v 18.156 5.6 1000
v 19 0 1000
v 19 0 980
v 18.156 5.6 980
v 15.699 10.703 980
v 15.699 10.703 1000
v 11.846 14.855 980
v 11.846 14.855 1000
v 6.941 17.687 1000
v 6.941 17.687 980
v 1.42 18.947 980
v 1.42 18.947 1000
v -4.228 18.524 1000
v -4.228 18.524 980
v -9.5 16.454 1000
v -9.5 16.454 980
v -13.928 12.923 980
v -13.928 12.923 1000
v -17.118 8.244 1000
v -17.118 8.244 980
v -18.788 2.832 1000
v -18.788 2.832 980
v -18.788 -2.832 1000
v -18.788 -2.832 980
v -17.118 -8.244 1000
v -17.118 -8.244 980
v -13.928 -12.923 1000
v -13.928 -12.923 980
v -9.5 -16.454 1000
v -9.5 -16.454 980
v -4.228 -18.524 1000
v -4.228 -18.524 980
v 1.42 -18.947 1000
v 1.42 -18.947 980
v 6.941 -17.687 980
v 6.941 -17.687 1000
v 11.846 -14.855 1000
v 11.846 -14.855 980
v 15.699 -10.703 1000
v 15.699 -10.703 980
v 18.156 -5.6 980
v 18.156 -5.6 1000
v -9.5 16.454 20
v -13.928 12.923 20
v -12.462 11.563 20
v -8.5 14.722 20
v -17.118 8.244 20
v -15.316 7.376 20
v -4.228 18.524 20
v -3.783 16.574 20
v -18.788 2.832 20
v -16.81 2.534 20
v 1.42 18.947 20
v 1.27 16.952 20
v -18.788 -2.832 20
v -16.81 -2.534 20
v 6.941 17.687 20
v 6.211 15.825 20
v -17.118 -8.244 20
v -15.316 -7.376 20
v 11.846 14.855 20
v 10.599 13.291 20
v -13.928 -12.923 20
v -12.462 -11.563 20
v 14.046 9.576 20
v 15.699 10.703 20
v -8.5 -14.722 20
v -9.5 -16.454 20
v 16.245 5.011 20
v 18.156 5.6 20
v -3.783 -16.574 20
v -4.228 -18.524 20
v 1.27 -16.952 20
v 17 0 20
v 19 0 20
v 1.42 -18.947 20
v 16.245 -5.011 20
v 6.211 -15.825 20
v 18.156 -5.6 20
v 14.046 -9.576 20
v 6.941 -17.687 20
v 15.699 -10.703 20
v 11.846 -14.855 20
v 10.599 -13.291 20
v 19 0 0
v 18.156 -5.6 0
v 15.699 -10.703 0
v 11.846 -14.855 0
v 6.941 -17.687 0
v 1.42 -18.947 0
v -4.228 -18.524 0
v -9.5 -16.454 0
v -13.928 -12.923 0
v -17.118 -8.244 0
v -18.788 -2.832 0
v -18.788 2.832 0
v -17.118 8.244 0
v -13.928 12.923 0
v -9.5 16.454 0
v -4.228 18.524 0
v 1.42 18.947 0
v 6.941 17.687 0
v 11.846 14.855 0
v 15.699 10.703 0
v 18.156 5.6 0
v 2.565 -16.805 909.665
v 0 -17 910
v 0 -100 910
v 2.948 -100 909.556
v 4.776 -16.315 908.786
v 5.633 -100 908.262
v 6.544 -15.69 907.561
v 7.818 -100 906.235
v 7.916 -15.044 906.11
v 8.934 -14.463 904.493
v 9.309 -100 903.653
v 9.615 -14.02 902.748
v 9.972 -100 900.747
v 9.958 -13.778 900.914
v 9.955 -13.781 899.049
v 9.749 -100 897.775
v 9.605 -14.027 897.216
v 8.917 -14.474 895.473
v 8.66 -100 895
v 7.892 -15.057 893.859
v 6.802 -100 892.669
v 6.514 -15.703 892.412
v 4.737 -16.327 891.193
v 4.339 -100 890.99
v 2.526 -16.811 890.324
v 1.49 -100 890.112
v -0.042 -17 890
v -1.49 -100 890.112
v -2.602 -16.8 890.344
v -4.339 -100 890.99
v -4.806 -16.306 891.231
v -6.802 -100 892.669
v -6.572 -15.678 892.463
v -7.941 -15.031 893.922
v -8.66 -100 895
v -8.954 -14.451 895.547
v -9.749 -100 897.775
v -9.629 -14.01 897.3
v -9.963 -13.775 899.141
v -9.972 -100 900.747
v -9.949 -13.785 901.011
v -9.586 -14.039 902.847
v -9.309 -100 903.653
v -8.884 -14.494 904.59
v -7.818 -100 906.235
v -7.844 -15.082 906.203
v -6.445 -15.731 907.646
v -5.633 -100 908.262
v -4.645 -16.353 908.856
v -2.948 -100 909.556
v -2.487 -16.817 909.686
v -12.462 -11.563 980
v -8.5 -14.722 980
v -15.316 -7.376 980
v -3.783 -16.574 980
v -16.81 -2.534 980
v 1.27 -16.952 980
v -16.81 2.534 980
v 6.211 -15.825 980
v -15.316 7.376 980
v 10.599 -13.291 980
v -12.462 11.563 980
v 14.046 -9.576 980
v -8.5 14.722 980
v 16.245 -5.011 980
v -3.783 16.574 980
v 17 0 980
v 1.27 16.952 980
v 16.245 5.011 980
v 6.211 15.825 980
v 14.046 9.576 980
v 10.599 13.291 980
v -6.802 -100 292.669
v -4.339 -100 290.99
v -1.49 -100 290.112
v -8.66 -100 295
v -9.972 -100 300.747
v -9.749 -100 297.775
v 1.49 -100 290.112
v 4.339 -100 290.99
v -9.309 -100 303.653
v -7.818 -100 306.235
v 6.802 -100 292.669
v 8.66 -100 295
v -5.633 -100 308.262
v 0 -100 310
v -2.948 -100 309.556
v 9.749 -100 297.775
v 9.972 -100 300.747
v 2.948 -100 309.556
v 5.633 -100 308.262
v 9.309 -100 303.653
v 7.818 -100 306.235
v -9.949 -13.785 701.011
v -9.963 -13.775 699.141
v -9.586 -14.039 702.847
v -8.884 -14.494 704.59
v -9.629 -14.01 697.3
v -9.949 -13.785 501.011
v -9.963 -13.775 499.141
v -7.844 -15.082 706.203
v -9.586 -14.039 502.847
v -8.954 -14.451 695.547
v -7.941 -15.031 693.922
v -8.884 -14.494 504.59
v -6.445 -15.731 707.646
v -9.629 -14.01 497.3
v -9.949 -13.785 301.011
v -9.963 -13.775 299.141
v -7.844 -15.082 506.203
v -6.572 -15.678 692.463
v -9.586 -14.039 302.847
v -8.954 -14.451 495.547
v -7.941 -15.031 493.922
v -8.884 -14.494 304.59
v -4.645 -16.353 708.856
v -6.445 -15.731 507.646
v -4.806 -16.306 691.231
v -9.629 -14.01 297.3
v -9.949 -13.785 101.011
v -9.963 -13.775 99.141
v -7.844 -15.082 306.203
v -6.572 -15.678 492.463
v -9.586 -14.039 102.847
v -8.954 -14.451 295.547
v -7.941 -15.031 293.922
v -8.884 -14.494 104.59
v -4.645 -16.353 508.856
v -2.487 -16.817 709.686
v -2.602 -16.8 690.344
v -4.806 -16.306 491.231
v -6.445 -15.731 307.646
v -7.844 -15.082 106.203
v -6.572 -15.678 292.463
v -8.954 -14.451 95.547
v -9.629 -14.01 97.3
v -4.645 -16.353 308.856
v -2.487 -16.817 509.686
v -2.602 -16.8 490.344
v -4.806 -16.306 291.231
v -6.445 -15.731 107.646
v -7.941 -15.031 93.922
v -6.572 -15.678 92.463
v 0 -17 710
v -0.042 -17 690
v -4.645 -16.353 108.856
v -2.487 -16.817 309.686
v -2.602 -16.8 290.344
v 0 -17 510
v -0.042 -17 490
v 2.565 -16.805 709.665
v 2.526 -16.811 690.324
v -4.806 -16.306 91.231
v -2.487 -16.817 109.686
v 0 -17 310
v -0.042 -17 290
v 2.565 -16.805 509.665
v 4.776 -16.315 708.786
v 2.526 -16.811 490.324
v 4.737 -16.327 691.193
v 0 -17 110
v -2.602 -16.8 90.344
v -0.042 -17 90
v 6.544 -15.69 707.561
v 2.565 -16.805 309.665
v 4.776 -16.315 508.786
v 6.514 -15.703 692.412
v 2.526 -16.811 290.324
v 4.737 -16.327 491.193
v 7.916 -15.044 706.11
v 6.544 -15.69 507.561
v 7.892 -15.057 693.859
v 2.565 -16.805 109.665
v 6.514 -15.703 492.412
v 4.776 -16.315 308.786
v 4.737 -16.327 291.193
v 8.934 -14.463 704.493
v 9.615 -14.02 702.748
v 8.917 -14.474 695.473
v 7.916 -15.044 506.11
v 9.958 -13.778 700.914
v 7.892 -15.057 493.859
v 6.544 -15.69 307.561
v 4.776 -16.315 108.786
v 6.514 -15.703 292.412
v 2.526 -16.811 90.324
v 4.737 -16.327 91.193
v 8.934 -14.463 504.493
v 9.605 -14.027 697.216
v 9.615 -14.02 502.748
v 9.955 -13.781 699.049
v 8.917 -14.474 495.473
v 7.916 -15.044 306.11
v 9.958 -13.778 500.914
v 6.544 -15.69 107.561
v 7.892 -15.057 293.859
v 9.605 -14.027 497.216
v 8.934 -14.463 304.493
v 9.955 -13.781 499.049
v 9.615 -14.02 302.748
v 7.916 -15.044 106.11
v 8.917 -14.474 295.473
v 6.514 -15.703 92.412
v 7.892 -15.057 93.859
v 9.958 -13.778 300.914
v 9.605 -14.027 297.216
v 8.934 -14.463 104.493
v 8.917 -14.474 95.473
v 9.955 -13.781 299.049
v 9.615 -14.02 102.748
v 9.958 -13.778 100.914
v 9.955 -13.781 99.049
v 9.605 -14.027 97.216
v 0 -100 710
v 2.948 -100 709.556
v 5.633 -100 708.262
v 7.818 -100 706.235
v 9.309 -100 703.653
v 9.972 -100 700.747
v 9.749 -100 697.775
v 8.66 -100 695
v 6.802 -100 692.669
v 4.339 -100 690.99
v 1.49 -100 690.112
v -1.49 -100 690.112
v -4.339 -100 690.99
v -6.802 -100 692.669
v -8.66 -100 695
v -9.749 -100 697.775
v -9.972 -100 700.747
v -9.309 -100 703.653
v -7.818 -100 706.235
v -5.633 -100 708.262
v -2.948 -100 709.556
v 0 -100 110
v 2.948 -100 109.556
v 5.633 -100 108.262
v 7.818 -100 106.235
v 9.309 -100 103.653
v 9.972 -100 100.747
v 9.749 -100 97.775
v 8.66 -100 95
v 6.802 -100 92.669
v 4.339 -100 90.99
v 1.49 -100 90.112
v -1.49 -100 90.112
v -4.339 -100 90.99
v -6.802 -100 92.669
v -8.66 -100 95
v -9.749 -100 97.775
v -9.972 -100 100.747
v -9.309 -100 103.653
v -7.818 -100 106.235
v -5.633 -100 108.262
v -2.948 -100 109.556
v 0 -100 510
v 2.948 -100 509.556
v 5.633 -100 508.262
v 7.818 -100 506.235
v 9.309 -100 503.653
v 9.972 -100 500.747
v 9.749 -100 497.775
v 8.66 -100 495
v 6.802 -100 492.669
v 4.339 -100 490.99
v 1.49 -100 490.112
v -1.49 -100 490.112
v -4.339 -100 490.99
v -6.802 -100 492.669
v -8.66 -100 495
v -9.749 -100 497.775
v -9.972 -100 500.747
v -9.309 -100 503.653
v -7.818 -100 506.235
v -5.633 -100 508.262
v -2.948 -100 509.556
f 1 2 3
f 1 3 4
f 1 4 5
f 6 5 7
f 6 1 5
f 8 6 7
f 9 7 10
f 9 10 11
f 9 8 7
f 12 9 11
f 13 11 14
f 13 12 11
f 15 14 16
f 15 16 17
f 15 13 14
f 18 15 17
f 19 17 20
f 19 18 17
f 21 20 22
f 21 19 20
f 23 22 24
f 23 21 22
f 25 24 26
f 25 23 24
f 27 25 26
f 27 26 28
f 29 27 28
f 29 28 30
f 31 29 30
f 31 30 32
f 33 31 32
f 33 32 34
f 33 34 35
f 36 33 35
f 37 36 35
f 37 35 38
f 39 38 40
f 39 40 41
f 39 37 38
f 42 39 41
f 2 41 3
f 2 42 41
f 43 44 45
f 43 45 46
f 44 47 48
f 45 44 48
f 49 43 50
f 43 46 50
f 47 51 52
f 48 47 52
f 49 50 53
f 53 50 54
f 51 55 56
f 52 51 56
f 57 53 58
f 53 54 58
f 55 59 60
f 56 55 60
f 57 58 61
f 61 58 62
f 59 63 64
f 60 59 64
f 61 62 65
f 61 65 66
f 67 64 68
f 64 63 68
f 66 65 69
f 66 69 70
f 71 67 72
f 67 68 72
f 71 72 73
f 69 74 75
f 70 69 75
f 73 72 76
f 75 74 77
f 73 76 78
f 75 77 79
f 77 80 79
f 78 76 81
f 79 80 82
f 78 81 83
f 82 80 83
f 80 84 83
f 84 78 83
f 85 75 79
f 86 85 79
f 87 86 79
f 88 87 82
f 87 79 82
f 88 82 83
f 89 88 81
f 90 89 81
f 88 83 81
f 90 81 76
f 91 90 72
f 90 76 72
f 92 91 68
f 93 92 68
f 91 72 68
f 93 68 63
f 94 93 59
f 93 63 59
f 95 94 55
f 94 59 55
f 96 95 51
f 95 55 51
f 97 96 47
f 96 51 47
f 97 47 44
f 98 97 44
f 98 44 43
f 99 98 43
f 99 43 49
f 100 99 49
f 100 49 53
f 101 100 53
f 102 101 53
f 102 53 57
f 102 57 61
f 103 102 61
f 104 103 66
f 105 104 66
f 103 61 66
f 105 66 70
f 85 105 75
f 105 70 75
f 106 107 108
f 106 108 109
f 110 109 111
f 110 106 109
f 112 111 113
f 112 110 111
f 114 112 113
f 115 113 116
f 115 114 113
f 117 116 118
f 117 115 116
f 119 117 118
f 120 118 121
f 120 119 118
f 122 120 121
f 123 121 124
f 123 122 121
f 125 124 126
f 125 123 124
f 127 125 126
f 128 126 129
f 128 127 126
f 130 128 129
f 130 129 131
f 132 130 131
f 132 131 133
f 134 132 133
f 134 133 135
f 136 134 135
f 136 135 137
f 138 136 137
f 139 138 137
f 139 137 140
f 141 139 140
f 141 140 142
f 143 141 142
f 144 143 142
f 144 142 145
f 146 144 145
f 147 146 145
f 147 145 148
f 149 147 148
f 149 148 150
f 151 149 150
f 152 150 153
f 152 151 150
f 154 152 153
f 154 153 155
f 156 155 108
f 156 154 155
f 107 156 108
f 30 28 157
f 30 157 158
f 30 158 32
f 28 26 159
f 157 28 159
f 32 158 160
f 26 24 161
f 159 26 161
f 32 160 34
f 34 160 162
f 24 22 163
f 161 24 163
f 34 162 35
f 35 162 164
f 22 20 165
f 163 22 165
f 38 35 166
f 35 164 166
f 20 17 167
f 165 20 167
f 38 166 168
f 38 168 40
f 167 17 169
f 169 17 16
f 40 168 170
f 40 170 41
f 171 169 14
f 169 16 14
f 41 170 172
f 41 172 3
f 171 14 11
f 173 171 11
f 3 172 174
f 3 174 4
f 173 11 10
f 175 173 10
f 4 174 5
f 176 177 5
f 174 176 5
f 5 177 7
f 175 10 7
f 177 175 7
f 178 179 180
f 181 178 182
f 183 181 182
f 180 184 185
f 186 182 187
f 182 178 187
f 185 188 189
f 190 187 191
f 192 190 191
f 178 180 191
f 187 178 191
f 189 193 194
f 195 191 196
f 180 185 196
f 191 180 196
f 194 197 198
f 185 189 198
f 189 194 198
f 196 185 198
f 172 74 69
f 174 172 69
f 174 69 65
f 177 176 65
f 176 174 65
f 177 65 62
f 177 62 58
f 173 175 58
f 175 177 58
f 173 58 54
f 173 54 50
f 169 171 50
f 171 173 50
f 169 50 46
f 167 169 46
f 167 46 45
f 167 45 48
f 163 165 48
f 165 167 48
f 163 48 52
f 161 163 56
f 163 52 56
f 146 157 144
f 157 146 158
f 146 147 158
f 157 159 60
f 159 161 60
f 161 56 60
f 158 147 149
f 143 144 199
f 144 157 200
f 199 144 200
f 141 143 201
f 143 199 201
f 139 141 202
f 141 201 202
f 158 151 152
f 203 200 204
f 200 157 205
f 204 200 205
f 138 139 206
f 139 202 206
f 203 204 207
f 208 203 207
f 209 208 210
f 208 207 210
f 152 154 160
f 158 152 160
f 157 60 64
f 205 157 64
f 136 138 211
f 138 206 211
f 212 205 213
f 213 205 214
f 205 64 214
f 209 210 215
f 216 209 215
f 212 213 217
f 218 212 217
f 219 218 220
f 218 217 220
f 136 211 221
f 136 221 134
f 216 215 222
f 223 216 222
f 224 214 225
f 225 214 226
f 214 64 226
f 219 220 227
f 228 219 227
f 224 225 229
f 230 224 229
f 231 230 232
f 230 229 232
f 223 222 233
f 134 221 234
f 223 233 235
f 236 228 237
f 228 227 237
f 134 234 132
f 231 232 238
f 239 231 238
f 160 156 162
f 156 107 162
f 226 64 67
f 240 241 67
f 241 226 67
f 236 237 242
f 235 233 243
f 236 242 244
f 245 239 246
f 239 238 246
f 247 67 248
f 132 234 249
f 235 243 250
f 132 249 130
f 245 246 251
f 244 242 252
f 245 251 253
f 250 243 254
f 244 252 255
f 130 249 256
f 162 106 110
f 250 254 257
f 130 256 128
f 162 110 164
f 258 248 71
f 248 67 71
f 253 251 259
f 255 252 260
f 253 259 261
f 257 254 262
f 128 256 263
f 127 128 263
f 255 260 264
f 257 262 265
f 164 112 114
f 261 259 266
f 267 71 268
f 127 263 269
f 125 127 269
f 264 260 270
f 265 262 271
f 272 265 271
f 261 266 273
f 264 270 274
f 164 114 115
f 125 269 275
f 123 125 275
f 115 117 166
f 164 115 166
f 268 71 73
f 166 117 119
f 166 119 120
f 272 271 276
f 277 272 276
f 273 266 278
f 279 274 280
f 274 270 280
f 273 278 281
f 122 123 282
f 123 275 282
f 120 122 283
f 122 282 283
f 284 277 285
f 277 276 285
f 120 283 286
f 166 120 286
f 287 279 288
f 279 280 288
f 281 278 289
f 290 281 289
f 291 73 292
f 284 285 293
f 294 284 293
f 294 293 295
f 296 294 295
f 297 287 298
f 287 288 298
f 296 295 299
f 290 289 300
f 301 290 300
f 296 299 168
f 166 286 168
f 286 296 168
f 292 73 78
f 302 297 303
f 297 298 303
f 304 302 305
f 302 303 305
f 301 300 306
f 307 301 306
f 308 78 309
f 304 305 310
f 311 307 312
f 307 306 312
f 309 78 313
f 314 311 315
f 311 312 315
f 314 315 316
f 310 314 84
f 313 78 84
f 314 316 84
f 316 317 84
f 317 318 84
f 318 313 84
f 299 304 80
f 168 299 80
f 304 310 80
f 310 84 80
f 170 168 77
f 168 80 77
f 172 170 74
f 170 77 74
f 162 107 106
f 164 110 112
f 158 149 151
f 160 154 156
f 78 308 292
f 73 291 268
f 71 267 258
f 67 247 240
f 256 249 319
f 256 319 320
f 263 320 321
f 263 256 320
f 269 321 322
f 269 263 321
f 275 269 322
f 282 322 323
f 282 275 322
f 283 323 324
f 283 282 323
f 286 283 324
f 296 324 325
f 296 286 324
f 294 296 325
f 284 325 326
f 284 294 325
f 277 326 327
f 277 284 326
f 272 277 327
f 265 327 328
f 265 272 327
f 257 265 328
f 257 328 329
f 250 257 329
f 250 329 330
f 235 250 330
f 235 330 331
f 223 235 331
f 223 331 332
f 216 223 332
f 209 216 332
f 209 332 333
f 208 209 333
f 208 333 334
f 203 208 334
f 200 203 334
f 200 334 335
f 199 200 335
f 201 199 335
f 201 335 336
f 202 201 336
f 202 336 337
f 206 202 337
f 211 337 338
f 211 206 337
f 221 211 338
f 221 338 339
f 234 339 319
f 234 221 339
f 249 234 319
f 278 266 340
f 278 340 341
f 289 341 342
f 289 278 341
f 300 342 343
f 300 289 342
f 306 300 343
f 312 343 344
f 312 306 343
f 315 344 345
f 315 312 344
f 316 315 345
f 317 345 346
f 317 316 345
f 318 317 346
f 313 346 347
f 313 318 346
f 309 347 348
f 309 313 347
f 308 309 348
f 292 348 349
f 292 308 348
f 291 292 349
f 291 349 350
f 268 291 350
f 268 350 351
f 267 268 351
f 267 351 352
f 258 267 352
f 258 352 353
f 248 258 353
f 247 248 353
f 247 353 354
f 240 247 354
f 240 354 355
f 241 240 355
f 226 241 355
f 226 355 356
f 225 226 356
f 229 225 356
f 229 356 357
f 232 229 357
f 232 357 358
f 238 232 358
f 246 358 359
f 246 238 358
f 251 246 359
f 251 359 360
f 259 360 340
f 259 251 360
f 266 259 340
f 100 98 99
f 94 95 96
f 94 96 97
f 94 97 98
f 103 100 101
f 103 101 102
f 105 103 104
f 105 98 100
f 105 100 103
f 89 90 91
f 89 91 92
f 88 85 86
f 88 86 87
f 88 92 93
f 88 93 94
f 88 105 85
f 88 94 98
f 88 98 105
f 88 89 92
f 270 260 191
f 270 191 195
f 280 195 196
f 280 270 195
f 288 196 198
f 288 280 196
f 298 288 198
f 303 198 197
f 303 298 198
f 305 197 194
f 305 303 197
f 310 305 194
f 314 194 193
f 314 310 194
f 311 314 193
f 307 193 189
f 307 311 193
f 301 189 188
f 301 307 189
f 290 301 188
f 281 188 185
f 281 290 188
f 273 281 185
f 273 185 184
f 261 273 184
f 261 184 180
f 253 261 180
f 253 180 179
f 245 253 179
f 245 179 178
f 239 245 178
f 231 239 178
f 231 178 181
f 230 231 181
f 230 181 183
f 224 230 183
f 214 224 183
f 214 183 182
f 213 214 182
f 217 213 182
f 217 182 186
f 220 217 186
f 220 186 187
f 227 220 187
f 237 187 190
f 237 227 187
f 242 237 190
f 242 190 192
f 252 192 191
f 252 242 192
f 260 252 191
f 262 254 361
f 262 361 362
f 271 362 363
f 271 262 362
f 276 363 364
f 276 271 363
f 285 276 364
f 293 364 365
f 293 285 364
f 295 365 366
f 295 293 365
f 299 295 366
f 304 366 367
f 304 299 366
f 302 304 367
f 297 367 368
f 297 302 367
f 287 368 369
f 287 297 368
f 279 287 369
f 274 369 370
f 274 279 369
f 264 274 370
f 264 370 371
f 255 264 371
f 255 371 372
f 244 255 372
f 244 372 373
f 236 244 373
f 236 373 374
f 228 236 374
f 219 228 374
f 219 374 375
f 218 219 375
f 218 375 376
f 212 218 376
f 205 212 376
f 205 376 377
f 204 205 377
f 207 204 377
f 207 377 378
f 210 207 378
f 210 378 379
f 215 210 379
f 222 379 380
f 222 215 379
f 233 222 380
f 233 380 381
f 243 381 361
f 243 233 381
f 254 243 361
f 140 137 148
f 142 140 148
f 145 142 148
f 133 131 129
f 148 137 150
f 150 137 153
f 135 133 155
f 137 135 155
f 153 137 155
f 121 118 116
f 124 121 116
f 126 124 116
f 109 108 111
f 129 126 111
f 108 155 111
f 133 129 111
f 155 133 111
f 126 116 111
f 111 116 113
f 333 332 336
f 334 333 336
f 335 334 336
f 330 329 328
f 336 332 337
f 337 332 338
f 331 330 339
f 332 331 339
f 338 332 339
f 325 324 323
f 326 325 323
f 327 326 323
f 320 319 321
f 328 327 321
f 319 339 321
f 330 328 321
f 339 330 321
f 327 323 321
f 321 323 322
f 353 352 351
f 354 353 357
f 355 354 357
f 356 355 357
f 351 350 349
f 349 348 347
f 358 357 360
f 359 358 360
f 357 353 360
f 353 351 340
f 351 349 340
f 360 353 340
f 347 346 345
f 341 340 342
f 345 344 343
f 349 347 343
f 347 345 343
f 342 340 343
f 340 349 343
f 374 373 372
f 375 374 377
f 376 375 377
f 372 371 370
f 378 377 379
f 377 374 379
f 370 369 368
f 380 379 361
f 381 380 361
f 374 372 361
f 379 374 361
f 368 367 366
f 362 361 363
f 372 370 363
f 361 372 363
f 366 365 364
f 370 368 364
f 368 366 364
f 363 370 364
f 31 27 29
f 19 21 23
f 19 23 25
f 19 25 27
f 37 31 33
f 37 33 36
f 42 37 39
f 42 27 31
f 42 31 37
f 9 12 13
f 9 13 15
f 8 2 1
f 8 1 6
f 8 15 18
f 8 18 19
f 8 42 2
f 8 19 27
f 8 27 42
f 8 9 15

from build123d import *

# Parameters (mm, degrees)
SKETCH1_R           = 17
BOSS_EXTRUDE1_DEPTH = 1000
SKETCH2_R           = 19
BOSS_EXTRUDE2_DEPTH = 20
BOSS_EXTRUDE3_START = -20
SKETCH3_R           = 19
BOSS_EXTRUDE3_DEPTH = 20
SKETCH4_R           = 10
BOSS_EXTRUDE4_DEPTH = 100


with BuildPart() as part:
    # Sketch1 → Boss-Extrude1 (new body)
    with BuildSketch(Plane.XY):
        Circle(SKETCH1_R)
    extrude(amount=BOSS_EXTRUDE1_DEPTH)

    # Sketch2 → Boss-Extrude2 (add)
    with BuildSketch(Plane.XY.offset(1000)):
        Circle(SKETCH2_R)
    extrude(amount=-BOSS_EXTRUDE2_DEPTH)

    # Sketch3 → Boss-Extrude3 (add)
    with BuildSketch(Plane(origin=(0, 0, 0), x_dir=(-1, 0, 0), z_dir=(0, 0, -1)).offset(BOSS_EXTRUDE3_START)):
        with Locations(Location((0, 0, 0), (0, 0, 180))):
            Circle(SKETCH3_R)
    extrude(amount=BOSS_EXTRUDE3_DEPTH)

    # Sketch4 → Boss-Extrude4 (add)
    with BuildSketch(Plane(origin=(0, 0, 0), x_dir=(1, 0, 0), z_dir=(0, 1, 0))):
        with Locations(Location((0, -500, 0), (0, 0, 270))):
            Circle(SKETCH4_R)
        with Locations(Location((0, -300, 0), (0, 0, 270))):
            Circle(SKETCH4_R)
        with Locations(Location((0, -100, 0), (0, 0, 270))):
            Circle(SKETCH4_R)
        with Locations(Location((0, -700, 0), (0, 0, 270))):
            Circle(SKETCH4_R)
        with Locations(Location((0, -900, 0), (0, 0, 270))):
            Circle(SKETCH4_R)
    extrude(amount=-BOSS_EXTRUDE4_DEPTH)


solid = part.part
